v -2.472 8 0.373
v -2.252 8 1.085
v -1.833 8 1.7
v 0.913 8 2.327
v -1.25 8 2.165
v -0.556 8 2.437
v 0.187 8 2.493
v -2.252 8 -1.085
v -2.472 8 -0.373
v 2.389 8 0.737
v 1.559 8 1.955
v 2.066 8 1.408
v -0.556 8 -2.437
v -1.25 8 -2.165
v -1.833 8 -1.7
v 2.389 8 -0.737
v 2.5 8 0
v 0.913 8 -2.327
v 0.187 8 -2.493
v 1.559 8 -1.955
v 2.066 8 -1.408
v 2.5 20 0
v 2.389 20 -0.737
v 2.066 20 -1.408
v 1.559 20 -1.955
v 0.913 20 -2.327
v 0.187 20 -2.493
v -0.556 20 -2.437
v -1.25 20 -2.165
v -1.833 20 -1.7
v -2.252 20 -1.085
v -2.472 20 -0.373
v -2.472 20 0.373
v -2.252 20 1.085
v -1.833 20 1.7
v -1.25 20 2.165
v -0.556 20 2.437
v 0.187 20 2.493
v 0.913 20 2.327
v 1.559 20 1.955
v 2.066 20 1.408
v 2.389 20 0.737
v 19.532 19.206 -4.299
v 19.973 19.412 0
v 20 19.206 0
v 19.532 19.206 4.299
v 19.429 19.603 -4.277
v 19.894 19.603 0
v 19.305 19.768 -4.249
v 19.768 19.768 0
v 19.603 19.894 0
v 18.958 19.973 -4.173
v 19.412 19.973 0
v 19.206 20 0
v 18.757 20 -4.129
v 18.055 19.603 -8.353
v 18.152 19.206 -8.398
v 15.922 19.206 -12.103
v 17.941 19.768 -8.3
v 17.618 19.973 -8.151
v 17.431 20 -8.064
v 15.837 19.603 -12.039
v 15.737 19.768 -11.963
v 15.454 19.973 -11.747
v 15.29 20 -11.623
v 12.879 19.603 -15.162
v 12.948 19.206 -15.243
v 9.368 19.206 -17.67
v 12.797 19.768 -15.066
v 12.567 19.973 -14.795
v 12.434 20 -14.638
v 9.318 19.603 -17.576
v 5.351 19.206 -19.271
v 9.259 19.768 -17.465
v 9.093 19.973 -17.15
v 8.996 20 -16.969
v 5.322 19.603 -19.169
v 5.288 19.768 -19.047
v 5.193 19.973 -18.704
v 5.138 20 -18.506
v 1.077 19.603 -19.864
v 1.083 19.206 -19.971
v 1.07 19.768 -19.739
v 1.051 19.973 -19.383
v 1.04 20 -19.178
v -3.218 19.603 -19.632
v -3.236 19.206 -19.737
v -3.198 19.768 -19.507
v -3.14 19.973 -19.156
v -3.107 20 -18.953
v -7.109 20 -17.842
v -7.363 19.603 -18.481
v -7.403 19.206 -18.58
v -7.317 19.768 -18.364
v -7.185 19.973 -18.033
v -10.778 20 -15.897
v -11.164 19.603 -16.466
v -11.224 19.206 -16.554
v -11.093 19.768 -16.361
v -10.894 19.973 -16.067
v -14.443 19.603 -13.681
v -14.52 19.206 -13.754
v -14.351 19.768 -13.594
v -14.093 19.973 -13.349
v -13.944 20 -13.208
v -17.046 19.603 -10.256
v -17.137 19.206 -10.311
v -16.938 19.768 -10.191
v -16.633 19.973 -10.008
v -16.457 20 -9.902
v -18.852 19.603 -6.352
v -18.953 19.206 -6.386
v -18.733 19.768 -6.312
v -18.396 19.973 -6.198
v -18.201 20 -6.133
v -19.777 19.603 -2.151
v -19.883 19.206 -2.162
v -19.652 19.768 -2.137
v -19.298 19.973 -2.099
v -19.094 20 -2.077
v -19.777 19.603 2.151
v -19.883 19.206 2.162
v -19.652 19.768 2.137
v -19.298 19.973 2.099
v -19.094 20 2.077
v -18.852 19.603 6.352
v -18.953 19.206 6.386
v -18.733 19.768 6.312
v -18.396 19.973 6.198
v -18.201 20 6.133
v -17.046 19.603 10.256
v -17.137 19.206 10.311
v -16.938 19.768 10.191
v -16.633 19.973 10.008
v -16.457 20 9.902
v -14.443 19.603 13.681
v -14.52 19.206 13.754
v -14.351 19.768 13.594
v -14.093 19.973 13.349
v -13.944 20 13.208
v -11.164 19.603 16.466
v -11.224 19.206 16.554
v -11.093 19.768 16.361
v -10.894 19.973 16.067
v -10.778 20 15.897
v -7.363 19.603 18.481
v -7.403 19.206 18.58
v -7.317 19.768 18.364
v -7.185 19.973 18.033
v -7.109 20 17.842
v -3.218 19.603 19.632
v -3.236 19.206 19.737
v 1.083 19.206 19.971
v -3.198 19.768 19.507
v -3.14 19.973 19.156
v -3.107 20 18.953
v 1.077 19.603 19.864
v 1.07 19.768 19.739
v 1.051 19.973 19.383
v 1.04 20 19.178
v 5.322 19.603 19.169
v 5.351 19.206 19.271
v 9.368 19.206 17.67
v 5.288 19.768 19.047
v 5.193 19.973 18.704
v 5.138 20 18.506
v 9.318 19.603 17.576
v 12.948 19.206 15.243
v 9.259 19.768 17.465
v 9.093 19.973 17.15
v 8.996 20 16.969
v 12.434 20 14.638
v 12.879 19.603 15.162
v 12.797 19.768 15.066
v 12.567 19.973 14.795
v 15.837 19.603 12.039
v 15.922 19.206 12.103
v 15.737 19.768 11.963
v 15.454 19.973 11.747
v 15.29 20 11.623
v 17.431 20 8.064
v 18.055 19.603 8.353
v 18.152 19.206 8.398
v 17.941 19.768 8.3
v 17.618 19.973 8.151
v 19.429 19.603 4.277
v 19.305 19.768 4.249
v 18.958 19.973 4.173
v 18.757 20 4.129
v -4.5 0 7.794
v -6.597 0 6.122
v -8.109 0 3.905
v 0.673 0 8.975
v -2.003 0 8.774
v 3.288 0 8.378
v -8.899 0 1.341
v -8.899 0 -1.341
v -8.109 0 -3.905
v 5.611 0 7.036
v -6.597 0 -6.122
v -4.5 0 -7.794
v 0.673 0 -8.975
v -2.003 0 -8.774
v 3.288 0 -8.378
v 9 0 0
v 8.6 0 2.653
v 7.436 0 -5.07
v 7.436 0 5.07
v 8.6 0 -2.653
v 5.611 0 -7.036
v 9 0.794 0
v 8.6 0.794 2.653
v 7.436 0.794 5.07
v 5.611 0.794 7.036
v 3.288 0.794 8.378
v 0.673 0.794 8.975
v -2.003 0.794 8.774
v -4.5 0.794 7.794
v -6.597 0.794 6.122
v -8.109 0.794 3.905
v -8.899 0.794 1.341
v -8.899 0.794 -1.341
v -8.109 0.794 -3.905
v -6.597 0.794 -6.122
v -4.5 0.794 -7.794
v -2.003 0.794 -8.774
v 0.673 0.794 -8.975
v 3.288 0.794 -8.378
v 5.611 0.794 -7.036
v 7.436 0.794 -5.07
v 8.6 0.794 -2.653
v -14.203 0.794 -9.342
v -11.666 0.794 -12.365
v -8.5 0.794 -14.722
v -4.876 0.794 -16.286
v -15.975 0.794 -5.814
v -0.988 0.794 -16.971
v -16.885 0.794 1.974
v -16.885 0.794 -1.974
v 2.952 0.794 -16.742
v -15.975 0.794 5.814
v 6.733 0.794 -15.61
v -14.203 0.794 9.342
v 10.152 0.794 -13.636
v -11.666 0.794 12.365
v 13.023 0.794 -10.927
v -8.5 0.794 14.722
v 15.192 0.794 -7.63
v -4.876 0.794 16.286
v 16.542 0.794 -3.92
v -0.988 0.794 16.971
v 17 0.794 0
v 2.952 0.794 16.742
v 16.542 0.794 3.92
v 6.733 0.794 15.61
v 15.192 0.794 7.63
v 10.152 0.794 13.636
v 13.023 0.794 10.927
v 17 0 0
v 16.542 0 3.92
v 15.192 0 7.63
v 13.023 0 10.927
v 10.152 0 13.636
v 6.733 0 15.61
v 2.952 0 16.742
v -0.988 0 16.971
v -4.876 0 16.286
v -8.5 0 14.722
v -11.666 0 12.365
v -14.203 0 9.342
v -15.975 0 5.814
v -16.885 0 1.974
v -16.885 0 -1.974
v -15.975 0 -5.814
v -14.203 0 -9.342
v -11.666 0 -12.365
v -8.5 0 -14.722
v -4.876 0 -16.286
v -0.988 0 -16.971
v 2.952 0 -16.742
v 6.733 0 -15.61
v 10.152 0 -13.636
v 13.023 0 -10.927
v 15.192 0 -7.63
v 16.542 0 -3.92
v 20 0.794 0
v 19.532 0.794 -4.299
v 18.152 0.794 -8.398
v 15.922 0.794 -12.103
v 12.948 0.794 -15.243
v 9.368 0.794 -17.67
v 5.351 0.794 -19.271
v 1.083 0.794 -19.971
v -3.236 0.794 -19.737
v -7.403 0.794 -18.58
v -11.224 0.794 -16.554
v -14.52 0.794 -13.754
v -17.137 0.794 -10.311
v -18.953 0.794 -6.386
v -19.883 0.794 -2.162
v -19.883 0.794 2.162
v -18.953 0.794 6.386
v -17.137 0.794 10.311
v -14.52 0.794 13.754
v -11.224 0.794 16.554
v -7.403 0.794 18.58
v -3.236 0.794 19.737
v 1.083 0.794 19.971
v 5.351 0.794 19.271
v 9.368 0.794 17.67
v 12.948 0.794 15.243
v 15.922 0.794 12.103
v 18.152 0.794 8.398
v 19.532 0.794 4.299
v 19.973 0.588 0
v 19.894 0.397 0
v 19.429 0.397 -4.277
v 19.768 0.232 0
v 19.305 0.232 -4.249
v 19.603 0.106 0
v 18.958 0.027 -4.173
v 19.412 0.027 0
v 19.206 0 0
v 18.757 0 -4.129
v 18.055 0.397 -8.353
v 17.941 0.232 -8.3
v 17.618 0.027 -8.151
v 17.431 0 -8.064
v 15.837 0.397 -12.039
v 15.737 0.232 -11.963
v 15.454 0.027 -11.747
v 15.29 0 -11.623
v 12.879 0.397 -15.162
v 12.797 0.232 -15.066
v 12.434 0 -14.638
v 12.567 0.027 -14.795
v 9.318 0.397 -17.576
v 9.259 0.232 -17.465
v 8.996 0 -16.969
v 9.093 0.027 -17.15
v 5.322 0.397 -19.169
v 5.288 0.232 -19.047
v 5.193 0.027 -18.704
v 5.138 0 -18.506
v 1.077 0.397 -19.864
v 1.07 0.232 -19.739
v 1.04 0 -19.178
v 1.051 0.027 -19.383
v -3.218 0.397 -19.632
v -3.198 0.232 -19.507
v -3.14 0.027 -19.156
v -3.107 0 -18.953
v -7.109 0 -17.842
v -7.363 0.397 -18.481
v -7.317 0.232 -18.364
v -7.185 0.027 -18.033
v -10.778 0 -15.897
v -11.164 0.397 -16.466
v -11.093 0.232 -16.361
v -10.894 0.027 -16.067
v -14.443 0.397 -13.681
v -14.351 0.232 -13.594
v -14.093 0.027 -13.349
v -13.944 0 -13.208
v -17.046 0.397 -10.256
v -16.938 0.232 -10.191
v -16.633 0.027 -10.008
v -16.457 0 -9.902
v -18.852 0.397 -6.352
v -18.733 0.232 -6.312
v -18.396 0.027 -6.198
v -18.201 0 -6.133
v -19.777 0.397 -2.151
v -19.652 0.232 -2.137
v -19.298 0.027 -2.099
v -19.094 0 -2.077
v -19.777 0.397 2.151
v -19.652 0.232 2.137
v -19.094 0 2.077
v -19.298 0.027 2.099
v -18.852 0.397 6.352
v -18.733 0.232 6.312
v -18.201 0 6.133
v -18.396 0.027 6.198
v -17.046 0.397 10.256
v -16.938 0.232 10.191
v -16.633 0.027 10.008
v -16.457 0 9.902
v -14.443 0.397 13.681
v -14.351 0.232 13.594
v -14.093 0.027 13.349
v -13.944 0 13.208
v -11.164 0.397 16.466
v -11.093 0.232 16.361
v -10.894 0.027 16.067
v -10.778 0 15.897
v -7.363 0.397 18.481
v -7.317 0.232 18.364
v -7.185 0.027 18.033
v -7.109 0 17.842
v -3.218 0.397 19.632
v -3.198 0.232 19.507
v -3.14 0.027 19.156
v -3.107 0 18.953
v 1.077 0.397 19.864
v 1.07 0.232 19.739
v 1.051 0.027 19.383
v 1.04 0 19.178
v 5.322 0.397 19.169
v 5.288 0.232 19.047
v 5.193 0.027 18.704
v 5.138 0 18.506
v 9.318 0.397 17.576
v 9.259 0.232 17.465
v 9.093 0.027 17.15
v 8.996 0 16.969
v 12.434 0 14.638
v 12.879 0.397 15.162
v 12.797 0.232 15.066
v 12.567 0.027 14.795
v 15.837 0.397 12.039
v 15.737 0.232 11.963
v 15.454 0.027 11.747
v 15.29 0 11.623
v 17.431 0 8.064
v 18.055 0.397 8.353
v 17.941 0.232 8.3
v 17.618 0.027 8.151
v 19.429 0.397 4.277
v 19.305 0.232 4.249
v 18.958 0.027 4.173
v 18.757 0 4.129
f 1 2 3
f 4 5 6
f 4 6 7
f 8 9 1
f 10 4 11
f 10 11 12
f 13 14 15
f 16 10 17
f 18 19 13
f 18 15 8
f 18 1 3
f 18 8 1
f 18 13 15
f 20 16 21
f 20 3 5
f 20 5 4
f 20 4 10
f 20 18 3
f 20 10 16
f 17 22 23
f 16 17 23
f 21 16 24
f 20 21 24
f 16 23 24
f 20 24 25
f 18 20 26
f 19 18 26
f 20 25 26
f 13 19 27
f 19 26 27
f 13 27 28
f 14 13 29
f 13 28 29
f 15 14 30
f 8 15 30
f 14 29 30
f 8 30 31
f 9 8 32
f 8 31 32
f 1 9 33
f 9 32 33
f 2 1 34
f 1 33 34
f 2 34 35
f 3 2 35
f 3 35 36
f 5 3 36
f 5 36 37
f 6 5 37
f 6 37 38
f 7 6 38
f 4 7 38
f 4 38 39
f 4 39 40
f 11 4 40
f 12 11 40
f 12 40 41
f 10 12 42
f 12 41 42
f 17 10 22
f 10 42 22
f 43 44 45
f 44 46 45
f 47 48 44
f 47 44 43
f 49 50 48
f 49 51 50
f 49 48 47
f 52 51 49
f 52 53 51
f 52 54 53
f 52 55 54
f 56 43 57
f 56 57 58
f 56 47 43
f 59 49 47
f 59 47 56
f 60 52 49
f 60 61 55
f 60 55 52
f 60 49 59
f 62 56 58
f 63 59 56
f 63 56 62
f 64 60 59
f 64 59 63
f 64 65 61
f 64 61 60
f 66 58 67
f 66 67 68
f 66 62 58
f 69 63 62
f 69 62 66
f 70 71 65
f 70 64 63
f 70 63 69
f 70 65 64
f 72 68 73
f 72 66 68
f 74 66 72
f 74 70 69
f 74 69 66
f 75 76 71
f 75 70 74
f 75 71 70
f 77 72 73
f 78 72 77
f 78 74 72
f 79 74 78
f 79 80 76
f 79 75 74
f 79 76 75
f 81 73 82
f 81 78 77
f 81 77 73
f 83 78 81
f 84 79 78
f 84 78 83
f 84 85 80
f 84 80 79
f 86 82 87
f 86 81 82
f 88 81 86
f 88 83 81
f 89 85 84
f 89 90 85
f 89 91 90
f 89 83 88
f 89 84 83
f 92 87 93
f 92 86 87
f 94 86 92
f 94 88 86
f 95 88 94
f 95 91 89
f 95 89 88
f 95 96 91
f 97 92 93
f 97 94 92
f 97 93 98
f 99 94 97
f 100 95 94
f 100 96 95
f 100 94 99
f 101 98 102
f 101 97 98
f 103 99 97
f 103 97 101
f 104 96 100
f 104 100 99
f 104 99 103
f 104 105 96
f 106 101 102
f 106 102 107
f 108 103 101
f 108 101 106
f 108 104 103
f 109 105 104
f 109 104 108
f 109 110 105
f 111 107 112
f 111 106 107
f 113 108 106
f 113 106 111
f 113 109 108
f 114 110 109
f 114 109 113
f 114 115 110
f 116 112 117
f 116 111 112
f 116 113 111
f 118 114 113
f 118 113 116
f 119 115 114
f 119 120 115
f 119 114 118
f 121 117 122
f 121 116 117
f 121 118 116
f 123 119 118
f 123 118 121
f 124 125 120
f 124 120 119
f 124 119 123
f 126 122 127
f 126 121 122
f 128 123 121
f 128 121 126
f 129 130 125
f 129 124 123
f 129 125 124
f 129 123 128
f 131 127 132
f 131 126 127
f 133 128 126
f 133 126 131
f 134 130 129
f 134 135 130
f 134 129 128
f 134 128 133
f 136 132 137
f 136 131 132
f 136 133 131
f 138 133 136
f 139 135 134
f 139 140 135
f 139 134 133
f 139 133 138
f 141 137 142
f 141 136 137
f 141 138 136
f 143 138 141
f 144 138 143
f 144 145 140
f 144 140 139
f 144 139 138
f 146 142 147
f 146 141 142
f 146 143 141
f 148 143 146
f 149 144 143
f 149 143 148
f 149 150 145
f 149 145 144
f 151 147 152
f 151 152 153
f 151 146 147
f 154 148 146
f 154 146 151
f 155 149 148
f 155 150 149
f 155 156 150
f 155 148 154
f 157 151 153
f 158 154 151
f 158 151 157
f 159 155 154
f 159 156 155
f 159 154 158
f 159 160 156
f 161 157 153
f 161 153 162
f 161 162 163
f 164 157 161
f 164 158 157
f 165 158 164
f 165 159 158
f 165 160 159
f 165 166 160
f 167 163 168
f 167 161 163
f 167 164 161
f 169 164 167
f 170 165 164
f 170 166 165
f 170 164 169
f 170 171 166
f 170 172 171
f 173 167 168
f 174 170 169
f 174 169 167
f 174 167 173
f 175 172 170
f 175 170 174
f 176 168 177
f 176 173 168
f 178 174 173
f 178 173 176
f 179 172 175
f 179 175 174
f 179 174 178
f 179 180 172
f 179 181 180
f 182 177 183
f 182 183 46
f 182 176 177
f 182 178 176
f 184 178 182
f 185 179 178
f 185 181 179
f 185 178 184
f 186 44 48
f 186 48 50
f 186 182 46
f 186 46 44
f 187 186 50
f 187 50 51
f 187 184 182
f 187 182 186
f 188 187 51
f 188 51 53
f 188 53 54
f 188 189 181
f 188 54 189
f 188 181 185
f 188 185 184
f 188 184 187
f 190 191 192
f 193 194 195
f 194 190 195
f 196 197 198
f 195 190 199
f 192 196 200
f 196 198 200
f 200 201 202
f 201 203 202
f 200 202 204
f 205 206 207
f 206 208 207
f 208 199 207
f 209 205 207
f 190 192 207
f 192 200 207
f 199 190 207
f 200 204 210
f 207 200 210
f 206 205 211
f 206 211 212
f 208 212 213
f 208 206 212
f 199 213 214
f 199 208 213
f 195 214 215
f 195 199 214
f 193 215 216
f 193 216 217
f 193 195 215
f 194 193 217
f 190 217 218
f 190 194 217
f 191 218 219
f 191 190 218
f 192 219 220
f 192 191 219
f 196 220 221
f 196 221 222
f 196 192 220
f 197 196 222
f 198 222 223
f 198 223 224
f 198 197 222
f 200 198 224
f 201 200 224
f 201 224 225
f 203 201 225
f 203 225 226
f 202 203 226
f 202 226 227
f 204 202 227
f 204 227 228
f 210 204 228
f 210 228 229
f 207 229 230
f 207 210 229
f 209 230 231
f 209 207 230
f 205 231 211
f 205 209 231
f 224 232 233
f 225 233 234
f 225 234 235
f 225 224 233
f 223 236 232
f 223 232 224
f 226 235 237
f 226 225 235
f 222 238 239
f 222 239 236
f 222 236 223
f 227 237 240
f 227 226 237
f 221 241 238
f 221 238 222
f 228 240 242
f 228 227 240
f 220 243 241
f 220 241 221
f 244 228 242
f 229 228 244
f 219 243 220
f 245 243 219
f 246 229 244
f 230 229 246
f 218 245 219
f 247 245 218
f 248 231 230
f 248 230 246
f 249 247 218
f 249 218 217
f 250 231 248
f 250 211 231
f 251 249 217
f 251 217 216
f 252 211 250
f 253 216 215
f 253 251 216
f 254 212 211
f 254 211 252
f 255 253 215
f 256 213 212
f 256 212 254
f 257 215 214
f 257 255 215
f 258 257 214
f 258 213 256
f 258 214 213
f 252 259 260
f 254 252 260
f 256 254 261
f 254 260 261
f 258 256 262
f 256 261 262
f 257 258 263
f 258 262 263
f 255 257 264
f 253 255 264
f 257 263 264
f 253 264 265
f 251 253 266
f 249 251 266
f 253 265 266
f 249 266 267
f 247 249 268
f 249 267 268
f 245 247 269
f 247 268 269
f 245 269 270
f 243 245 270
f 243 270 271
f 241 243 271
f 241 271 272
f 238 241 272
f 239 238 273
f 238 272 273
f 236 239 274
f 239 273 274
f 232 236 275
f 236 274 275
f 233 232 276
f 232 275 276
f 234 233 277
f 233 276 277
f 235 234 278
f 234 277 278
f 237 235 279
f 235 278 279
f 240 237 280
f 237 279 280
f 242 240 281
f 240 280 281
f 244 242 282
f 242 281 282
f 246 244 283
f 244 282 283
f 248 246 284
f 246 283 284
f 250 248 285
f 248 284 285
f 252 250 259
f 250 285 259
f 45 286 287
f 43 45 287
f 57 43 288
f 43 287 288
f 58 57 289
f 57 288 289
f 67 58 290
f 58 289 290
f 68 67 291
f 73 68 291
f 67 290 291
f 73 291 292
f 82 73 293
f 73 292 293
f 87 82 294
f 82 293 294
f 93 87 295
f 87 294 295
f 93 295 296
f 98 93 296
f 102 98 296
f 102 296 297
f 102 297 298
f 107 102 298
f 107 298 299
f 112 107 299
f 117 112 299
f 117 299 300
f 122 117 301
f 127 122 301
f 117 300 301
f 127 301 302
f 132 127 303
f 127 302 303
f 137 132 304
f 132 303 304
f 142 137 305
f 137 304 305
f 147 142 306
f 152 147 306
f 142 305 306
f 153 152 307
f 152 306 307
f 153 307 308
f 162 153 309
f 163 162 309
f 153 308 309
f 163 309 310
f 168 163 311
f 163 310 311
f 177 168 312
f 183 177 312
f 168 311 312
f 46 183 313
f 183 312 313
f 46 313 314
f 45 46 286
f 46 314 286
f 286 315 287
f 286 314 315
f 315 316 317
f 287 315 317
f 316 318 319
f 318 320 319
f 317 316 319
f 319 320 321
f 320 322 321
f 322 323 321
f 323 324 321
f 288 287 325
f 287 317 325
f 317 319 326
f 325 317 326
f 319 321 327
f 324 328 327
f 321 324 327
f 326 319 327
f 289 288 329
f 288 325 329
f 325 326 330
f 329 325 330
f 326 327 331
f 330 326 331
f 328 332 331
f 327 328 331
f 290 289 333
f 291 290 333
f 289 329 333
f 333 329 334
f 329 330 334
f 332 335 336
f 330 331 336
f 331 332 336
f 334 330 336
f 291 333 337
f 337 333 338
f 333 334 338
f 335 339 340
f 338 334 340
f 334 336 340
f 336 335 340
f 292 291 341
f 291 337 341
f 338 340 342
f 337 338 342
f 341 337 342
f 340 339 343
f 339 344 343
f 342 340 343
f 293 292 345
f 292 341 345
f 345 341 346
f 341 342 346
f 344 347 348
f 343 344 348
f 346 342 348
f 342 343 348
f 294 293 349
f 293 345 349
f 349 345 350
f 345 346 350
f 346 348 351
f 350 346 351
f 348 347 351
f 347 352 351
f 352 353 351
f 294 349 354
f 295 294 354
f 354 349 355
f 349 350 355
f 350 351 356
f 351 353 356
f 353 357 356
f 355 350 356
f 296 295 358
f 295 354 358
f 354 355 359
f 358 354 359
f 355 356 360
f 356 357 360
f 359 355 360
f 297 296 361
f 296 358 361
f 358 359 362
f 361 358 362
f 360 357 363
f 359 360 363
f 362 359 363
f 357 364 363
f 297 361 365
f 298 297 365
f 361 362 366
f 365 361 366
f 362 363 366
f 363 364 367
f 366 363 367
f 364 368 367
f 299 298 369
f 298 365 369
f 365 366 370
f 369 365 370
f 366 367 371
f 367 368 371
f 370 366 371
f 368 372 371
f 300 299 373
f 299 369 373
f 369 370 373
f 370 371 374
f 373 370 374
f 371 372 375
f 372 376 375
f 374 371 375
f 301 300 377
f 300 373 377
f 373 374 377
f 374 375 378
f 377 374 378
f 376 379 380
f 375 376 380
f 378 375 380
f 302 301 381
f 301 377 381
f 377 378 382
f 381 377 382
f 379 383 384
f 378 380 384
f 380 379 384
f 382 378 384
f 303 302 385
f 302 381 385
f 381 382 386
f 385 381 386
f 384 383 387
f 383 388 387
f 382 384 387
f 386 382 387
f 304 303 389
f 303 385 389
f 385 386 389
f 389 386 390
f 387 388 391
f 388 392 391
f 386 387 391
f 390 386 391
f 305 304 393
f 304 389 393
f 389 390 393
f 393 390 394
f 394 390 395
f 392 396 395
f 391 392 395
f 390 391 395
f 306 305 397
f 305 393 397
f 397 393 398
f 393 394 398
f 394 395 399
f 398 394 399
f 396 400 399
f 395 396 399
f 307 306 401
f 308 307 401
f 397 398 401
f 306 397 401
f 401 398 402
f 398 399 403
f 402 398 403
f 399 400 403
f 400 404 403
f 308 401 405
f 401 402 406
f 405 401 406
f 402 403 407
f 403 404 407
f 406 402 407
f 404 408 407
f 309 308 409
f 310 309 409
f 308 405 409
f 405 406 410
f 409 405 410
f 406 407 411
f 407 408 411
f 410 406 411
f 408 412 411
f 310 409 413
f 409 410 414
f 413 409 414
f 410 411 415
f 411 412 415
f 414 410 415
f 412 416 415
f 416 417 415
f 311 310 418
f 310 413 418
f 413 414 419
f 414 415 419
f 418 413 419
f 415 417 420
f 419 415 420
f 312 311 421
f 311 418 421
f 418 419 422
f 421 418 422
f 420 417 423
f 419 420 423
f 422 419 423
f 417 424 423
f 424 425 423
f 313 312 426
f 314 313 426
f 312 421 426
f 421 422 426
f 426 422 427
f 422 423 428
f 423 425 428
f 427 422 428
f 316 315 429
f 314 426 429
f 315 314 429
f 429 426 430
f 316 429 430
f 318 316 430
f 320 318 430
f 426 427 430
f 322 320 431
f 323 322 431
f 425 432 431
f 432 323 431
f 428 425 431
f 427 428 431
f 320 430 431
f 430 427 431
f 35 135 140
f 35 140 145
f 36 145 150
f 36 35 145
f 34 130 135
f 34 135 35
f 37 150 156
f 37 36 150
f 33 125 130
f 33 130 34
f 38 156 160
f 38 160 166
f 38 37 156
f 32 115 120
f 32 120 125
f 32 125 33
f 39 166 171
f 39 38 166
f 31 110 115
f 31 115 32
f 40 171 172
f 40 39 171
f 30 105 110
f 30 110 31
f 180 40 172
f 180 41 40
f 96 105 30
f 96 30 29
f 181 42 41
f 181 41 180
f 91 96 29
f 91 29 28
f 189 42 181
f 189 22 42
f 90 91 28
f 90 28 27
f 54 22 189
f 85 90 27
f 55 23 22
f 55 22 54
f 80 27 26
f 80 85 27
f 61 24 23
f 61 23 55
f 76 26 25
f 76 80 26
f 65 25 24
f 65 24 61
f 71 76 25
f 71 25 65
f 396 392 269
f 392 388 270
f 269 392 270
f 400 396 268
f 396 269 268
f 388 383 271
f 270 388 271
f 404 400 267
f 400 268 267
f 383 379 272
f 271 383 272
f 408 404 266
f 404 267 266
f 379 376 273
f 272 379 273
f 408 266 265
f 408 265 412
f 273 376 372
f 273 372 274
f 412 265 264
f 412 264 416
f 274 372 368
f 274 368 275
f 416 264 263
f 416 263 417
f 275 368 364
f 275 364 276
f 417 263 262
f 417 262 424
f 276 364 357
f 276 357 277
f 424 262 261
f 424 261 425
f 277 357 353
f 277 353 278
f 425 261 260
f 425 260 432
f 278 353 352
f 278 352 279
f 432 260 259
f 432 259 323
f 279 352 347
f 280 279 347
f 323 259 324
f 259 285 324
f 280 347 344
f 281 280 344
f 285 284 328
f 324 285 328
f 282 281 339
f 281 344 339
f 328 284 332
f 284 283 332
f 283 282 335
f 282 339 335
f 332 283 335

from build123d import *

# Parameters (mm, degrees)
SKETCH1_R           = 20
BOSS_EXTRUDE1_DEPTH = 20
SKETCH2_R           = 2.5
CUT_EXTRUDE1_DEPTH  = 12
FILLET1_R           = 0.79375
SKETCH3_R           = 17
SKETCH3_R_2         = 9
CUT_EXTRUDE2_DEPTH  = 0.79375


with BuildPart() as part:
    # Sketch1 → Boss-Extrude1 (new body)
    with BuildSketch(Plane(origin=(0, 0, 0), x_dir=(1, 0, 0), z_dir=(0, 1, 0))):
        Circle(SKETCH1_R)
    extrude(amount=BOSS_EXTRUDE1_DEPTH)

    # Sketch2 → Cut-Extrude1 (cut)
    with BuildSketch(Plane(origin=(0, 20, 0), x_dir=(1, 0, 0), z_dir=(0, 1, 0))):
        Circle(SKETCH2_R)
    extrude(amount=-CUT_EXTRUDE1_DEPTH, mode=Mode.SUBTRACT)

    # Fillet1
    fillet1_edges = [part.edges().sort_by_distance(p)[0] for p in [
        (-20, 0, 0),
        (-20, 20, 0),
    ]]
    fillet(fillet1_edges, radius=FILLET1_R)

    # Sketch3 → Cut-Extrude2 (cut)
    with BuildSketch(Plane.XZ):
        Circle(SKETCH3_R)
        Circle(SKETCH3_R_2, mode=Mode.SUBTRACT)
    extrude(amount=-CUT_EXTRUDE2_DEPTH, mode=Mode.SUBTRACT)


solid = part.part
